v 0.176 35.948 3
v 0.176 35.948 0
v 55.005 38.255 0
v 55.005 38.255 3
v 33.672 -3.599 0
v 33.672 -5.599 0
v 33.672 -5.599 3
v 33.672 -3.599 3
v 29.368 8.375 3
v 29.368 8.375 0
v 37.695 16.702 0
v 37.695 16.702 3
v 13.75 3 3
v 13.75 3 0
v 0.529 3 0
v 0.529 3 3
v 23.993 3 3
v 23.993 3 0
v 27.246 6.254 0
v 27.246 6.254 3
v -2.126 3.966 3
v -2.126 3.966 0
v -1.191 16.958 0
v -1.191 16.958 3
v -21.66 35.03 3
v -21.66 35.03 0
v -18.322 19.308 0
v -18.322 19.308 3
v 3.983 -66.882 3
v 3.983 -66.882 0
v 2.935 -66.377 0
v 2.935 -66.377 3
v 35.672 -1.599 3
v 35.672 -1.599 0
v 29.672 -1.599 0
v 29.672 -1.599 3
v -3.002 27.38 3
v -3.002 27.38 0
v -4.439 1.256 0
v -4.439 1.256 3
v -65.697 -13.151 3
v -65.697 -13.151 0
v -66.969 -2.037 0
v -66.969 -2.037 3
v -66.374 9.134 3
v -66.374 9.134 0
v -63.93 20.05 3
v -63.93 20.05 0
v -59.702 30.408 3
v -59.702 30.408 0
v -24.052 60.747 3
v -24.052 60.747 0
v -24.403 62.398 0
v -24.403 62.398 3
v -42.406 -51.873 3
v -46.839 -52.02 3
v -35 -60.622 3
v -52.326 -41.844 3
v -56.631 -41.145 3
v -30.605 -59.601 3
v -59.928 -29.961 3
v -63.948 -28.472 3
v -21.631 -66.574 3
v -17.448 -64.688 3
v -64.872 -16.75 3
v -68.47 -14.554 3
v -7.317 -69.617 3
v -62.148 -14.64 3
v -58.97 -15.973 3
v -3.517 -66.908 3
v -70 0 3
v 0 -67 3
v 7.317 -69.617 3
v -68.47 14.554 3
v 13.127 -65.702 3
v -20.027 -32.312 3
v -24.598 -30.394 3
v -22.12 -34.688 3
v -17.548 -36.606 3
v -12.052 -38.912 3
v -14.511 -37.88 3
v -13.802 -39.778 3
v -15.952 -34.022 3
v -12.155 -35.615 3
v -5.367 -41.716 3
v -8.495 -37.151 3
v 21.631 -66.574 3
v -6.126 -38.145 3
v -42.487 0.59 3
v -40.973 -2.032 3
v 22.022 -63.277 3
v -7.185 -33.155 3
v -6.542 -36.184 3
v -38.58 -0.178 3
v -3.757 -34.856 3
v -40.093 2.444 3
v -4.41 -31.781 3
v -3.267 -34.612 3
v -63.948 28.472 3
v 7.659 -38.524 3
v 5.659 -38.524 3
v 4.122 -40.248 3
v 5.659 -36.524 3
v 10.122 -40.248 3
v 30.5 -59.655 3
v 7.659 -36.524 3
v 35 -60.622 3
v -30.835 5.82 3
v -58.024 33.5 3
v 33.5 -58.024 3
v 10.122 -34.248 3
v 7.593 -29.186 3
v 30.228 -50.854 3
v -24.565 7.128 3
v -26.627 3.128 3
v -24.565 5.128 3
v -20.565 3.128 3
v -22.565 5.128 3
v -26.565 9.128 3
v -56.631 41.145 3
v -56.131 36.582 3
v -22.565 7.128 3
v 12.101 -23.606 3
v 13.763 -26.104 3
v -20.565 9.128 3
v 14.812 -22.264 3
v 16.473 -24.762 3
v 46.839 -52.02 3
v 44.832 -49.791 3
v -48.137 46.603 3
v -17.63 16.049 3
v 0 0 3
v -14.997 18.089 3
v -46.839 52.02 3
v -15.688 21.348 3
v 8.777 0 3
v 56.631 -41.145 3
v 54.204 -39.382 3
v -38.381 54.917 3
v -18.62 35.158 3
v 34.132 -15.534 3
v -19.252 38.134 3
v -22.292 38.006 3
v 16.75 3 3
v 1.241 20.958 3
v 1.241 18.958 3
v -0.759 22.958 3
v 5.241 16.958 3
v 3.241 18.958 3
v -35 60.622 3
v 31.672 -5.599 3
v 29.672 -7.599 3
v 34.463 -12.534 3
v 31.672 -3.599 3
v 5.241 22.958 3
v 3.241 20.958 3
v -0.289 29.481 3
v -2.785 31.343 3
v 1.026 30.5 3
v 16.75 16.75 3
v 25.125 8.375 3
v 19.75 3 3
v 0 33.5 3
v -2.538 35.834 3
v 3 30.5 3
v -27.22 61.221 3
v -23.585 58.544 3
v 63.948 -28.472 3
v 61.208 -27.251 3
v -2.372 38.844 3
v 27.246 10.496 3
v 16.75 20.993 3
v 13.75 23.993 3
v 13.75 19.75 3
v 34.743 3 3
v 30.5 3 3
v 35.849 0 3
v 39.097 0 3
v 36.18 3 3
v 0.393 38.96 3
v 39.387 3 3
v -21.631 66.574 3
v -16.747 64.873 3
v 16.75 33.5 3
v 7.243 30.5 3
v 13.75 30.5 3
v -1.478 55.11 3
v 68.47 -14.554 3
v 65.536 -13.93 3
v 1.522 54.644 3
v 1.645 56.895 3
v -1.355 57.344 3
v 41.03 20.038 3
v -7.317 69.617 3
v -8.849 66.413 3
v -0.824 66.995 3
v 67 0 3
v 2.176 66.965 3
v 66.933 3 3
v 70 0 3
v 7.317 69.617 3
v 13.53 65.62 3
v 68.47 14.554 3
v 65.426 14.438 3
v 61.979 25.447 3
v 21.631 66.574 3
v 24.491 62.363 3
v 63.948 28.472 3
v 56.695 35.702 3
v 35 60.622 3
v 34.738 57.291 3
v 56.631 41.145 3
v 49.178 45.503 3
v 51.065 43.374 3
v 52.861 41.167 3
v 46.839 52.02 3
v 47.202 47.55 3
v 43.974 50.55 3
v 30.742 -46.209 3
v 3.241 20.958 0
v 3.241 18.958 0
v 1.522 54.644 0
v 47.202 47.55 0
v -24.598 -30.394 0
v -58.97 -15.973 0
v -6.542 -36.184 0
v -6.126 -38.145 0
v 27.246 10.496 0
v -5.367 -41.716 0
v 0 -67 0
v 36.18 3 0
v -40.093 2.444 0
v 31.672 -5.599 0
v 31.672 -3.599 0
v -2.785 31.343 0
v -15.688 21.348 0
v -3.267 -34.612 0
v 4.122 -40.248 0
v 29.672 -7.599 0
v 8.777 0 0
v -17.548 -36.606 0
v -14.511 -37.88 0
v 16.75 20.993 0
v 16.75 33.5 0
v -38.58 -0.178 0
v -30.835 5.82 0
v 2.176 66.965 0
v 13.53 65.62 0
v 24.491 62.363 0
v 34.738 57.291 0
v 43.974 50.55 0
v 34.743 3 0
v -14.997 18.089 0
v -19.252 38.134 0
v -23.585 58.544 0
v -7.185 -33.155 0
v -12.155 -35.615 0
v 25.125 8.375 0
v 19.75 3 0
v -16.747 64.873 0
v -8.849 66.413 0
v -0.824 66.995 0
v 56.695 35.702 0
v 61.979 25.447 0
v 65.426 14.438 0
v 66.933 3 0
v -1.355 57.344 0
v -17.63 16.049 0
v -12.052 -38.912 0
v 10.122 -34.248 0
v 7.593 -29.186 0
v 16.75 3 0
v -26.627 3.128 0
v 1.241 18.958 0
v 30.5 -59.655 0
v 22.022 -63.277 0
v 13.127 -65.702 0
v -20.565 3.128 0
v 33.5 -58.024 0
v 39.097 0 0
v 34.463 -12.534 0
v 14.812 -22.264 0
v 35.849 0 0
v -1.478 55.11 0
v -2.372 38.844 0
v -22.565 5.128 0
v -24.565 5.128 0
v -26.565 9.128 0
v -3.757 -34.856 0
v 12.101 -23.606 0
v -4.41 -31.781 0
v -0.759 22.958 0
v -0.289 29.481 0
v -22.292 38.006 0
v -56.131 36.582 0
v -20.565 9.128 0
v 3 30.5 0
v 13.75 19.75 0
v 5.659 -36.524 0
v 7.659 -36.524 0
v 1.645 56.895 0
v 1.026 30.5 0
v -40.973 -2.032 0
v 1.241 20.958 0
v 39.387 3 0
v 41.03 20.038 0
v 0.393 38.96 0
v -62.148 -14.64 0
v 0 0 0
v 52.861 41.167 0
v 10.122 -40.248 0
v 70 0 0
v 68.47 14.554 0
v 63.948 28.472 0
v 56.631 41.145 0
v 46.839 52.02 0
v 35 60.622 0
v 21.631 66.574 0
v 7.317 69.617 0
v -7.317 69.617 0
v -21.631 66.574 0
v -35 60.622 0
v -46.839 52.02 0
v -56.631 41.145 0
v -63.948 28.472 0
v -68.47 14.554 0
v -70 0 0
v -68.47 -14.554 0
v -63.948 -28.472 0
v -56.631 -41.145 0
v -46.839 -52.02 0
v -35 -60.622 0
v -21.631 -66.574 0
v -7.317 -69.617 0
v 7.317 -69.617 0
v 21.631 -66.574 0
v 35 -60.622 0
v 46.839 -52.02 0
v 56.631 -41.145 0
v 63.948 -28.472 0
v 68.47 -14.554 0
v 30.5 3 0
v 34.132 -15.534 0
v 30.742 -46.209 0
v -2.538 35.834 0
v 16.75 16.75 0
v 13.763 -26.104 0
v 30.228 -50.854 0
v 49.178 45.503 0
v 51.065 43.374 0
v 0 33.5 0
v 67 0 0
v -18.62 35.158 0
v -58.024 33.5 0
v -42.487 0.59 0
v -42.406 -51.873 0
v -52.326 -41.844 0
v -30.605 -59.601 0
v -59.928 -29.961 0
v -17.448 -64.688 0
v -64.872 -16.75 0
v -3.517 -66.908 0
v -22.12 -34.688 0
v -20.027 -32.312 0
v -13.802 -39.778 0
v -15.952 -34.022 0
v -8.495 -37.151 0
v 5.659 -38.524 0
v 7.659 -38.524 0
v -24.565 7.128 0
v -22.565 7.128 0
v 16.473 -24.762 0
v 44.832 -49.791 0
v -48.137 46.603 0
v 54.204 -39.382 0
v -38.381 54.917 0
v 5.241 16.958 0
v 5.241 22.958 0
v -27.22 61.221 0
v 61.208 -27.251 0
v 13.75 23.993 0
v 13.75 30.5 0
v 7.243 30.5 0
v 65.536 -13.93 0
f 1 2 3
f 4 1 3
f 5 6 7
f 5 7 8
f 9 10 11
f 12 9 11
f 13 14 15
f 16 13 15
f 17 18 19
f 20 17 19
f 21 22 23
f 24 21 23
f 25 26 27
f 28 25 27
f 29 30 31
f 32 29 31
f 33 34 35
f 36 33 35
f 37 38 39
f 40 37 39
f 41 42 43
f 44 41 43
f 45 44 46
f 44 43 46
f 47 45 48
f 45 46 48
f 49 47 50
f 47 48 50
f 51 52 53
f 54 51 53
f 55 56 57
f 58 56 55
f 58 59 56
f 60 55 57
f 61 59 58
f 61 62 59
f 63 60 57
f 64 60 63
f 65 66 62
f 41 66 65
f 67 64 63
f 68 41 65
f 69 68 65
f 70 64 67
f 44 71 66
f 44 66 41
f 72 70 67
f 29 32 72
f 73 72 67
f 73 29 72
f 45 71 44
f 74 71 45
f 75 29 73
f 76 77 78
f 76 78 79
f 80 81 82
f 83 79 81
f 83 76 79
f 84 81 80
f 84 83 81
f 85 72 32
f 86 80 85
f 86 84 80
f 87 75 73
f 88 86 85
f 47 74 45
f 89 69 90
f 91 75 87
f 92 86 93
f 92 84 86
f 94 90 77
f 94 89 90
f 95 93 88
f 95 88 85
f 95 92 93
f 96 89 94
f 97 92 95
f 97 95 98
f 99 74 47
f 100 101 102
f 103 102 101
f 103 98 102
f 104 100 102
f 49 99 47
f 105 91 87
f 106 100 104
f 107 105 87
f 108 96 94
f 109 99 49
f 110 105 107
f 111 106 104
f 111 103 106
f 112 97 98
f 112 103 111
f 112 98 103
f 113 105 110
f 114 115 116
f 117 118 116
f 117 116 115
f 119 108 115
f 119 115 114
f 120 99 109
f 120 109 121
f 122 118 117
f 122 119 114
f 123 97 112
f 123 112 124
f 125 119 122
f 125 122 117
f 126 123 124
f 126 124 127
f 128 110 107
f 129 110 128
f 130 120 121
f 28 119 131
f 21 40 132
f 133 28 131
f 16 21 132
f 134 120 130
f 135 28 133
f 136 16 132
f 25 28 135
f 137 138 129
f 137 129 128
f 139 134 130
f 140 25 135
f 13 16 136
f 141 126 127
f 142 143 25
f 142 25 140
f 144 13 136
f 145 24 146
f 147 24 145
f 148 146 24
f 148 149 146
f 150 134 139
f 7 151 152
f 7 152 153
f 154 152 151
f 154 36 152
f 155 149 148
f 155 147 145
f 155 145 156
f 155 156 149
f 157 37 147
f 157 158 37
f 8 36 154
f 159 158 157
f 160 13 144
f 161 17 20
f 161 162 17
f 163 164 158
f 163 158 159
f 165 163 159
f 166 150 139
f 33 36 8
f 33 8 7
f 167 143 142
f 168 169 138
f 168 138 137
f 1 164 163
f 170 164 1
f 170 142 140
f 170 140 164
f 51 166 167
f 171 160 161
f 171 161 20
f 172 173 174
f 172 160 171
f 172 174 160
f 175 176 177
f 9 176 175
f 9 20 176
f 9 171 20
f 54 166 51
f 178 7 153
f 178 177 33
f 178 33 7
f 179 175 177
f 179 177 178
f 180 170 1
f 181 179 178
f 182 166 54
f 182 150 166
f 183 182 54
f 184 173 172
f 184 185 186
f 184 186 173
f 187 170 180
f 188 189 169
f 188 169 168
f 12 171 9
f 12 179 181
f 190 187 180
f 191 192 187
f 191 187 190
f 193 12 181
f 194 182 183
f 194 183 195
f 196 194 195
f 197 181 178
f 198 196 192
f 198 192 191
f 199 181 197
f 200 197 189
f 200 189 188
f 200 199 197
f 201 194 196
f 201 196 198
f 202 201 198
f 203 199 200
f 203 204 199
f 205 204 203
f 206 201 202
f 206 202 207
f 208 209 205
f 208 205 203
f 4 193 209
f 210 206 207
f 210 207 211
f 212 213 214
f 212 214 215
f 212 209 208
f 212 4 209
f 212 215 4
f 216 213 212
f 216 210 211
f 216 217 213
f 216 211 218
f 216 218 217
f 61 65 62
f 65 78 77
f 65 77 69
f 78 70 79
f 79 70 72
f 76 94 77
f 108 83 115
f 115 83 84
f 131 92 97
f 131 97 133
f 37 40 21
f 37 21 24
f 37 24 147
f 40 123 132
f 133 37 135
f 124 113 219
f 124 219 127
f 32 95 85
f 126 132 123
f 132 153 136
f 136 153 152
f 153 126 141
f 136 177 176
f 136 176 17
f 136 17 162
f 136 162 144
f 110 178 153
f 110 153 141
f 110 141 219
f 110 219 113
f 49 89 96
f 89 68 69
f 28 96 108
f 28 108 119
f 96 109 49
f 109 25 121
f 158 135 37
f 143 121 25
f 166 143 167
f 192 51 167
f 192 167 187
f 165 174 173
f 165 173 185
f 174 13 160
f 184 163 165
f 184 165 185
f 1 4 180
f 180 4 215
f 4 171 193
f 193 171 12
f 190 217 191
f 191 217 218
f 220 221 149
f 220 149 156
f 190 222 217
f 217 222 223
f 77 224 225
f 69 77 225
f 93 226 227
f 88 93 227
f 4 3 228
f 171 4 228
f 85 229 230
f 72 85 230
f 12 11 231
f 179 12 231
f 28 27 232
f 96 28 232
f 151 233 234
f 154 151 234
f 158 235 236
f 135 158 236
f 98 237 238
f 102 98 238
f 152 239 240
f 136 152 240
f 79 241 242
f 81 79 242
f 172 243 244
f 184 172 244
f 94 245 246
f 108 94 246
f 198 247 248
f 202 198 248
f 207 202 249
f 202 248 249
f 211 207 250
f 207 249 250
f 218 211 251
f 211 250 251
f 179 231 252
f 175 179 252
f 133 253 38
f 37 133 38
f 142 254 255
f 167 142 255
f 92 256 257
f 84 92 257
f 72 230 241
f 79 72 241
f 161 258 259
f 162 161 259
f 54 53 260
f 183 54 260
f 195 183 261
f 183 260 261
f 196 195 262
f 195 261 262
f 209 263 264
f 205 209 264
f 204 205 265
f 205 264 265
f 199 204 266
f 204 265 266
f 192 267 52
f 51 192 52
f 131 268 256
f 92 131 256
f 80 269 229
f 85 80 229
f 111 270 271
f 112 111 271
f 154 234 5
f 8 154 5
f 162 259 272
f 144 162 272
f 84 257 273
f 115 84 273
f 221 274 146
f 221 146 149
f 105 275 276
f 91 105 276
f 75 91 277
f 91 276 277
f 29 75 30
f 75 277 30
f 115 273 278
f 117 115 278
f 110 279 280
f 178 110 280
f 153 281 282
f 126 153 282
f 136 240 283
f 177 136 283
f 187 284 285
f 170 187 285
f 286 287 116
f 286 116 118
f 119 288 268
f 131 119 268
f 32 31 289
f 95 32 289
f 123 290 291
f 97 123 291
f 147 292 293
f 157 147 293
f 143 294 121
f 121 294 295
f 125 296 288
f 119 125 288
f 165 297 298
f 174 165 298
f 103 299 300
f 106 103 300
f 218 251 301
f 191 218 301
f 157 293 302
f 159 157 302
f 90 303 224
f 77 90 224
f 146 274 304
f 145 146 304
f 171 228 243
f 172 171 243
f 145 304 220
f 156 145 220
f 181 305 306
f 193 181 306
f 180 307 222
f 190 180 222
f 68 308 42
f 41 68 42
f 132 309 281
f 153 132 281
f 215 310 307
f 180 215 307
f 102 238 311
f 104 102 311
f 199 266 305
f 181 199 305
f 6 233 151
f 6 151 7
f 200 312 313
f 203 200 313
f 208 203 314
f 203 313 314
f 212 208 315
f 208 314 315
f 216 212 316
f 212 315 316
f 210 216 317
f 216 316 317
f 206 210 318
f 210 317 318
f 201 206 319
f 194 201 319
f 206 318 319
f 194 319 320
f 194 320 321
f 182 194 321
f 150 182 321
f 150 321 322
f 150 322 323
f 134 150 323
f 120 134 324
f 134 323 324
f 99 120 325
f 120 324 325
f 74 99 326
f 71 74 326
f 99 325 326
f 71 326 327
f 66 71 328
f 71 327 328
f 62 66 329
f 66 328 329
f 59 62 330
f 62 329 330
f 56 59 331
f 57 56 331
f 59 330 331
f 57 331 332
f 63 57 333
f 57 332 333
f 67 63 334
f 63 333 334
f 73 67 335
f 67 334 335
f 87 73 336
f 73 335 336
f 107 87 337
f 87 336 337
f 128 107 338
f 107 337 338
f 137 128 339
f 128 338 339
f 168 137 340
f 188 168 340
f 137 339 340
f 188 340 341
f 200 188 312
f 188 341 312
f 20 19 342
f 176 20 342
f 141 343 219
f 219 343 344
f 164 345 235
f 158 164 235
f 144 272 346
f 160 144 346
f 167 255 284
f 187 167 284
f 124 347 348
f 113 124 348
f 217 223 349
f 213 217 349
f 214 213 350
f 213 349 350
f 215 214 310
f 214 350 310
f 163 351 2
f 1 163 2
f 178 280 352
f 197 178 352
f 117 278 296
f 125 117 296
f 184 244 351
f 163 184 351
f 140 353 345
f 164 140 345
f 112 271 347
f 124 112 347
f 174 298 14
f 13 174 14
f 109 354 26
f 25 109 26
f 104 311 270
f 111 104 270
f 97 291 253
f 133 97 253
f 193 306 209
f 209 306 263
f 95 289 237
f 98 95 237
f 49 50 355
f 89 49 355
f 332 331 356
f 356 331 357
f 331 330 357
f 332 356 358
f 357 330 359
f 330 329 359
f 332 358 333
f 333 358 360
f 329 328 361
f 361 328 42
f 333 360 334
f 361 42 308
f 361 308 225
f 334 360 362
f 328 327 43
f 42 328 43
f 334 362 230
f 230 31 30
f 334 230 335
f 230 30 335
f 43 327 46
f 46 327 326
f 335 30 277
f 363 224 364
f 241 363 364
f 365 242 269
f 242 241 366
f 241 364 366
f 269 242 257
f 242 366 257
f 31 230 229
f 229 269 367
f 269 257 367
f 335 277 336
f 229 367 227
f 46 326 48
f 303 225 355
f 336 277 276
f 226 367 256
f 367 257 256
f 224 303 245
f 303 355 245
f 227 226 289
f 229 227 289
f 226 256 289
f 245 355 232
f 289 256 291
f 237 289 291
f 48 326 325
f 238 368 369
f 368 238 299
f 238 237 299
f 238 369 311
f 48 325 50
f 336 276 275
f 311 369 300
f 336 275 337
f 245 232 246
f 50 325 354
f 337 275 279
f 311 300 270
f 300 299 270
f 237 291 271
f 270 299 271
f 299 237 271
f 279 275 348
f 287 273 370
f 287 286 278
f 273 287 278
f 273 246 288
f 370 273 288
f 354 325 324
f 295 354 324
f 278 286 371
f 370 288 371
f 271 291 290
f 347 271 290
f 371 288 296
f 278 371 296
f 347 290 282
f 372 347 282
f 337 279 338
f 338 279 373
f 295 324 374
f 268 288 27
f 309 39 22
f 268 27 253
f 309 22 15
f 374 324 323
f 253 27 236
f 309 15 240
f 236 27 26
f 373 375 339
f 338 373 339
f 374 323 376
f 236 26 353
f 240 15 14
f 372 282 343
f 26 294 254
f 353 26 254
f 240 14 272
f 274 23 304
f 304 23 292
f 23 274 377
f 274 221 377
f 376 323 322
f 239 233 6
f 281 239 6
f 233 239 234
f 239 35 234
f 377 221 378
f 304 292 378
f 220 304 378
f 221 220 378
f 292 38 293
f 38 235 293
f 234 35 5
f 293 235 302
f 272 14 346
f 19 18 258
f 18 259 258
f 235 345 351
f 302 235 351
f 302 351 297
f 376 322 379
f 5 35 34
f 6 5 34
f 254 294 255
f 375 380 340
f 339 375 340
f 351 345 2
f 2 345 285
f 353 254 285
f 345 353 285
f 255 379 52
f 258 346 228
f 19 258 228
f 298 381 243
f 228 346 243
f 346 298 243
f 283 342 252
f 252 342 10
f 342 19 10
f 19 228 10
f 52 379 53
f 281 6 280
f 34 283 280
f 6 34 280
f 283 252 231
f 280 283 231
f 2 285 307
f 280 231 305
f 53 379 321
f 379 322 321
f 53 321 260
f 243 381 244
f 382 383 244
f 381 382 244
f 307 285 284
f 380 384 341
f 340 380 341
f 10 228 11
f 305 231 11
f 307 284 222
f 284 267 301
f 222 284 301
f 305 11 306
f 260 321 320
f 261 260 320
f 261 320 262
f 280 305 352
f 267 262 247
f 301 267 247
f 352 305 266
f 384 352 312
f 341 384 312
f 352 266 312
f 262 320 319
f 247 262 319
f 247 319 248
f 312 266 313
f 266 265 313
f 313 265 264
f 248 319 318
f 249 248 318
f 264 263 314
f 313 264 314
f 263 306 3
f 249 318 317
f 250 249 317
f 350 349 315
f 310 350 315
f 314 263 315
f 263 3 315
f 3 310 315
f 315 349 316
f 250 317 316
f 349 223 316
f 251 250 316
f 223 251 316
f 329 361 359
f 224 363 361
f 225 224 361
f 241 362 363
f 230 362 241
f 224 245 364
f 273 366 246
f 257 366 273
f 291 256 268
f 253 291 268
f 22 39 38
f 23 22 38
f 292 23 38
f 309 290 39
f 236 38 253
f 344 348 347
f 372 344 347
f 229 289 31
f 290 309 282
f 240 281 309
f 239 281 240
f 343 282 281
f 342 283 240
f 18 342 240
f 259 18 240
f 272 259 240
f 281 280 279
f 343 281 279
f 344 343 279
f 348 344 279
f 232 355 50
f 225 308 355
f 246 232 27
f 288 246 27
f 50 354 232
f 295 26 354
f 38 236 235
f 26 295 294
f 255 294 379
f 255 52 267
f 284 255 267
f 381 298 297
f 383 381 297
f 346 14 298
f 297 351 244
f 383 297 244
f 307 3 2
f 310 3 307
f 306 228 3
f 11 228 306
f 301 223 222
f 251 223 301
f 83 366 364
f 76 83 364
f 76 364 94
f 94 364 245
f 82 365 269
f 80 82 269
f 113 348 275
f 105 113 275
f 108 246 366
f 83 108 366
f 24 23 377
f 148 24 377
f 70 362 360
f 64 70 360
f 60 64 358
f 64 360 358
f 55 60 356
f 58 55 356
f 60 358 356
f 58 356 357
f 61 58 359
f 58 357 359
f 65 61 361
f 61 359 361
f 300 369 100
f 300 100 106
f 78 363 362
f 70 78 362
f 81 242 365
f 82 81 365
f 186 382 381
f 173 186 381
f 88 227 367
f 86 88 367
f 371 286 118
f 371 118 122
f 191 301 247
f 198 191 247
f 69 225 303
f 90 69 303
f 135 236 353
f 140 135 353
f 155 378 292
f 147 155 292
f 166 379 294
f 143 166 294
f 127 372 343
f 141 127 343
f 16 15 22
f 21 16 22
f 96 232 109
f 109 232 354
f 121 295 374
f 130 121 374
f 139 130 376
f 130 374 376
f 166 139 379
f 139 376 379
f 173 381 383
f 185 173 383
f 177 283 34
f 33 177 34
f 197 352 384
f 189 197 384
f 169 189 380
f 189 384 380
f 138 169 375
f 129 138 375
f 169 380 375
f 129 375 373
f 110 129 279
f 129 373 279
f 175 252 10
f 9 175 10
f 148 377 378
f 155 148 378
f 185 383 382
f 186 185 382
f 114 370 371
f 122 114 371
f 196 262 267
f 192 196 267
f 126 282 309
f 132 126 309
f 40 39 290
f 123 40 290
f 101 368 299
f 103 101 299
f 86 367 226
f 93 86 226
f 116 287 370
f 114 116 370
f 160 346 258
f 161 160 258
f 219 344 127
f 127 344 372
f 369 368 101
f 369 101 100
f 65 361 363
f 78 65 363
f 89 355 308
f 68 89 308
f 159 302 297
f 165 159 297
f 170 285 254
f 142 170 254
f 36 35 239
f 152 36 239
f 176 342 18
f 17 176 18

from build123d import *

# Parameters (mm, degrees)
F0_R     = 70
F0_W     = 2
F0_H     = 2
F1_DEPTH = 3


with BuildPart() as f1:
    # F0 (on Top) → F1 (new body)
    with BuildSketch(Plane.XY):
        Circle(F0_R)
        with BuildLine():
            Line((-64.872471, -16.75), (-22.119673, -34.687602))
            Line((-22.119673, -34.687602), (-3.517446, -66.907605))
            ThreePointArc((-3.517446, -66.907605), (-42.405678, -51.872521), (-64.872471, -16.75))
        make_face(mode=Mode.SUBTRACT)
        Polygon((-5.367487, -41.716243), (0, -67), (-17.548193, -36.605638), (-14.51137, -37.879784), (-13.802188, -39.778319), (-12.051845, -38.911716), align=None, mode=Mode.SUBTRACT)
        Polygon((-6.541978, -36.183757), (-6.125672, -38.144779), (-8.494983, -37.150698), align=None, mode=Mode.SUBTRACT)
        Polygon((-24.598448, -30.394239), (-58.970352, -15.972971), (-40.973159, -2.032406), align=None, mode=Mode.SUBTRACT)
        Polygon((-38.579524, -0.178304), (-30.835223, 5.820406), (-15.952495, -34.021783), (-20.026968, -32.312274), align=None, mode=Mode.SUBTRACT)
        Polygon((-12.154838, -35.615149), (-26.627104, 3.128202), (-20.564876, 3.128202), (-20.564876, 9.128202), (-26.564876, 9.128202), (-17.630423, 16.0488), (-7.185041, -33.154581), align=None, mode=Mode.SUBTRACT)
        Polygon((-4.438957, 1.256214), (12.101127, -23.605912), (-4.409872, -31.780582), (-14.996661, 18.088903), (-3.002486, 27.379551), align=None, mode=Mode.SUBTRACT)
        with BuildLine():
            Line((13.762816, -26.10367), (30.228223, -50.853546))
            Line((30.228223, -50.853546), (30.5, -59.65526))
            ThreePointArc((30.5, -59.65526), (17.615943, -64.642699), (3.982851, -66.881514))
            Line((3.982851, -66.881514), (2.934602, -66.377014))
            Line((2.934602, -66.377014), (-3.756953, -34.856183))
            Line((-3.756953, -34.856183), (-3.267222, -34.611524))
            Line((-3.267222, -34.611524), (4.122172, -40.248352))
            Line((4.122172, -40.248352), (10.122172, -40.248352))
            Line((10.122172, -40.248352), (10.122172, -34.248352))
            Line((10.122172, -34.248352), (7.593094, -29.185935))
            Line((7.593094, -29.185935), (13.762816, -26.10367))
        make_face(mode=Mode.SUBTRACT)
        with Locations((6.658501, -37.52363)):
            Rectangle(F0_W, F0_H, mode=Mode.SUBTRACT)
        Polygon((34.131849, -15.534241), (30.741558, -46.208985), (16.473278, -24.761707), align=None, mode=Mode.SUBTRACT)
        Polygon((0, 0), (34.46342, -12.534241), (14.811589, -22.26395), align=None, mode=Mode.SUBTRACT)
        Polygon((29.671986, -1.599358), (29.671986, -7.599358), (8.777233, 0), (35.848753, 0), (35.671986, -1.599358), align=None, mode=Mode.SUBTRACT)
        with Locations((32.671986, -4.599358)):
            Rectangle(F0_W, F0_H, mode=Mode.SUBTRACT)
        with BuildLine():
            Line((39.09744, 0), (67, 0))
            ThreePointArc((67, 0), (58.023702, -33.5), (33.5, -58.023702))
            Line((33.5, -58.023702), (39.09744, 0))
        make_face(mode=Mode.SUBTRACT)
        with BuildLine():
            Line((-42.487027, 0.58969), (-62.148088, -14.639702))
            Line((-62.148088, -14.639702), (-65.696695, -13.150829))
            ThreePointArc((-65.696695, -13.150829), (-66.374453, 9.134109), (-59.702408, 30.407605))
            Line((-59.702408, 30.407605), (-42.487027, 0.58969))
        make_face(mode=Mode.SUBTRACT)
        Polygon((-40.093392, 2.443792), (-58.023702, 33.5), (-21.659897, 35.029796), (-18.322244, 19.307651), align=None, mode=Mode.SUBTRACT)
        with Locations((-23.564876, 6.128202)):
            Rectangle(F0_W, F0_H, mode=Mode.SUBTRACT)
        Polygon((-18.620189, 35.157674), (-2.537579, 35.834256), (-2.784538, 31.343106), (-15.688482, 21.347754), align=None, mode=Mode.SUBTRACT)
        with BuildLine():
            ThreePointArc((-56.131438, 36.58226), (-43.458519, 50.993697), (-27.22012, 61.221443))
            Line((-27.22012, 61.221443), (-22.291688, 38.00587))
            Line((-22.291688, 38.00587), (-56.131438, 36.58226))
        make_face(mode=Mode.SUBTRACT)
        Polygon((-19.251979, 38.133748), (-23.584773, 58.543545), (-1.477635, 55.110162), (-2.372086, 38.843872), align=None, mode=Mode.SUBTRACT)
        with BuildLine():
            Line((-1.354779, 57.344402), (-24.052467, 60.746633))
            Line((-24.052467, 60.746633), (-24.403006, 62.397863))
            ThreePointArc((-24.403006, 62.397863), (-12.821278, 65.761804), (-0.824116, 66.994931))
            Line((-0.824116, 66.994931), (-1.354779, 57.344402))
        make_face(mode=Mode.SUBTRACT)
        Polygon((-0.289354, 29.481134), (1.025996, 30.5), (3, 30.5), (13.75, 19.75), (13.75, 3), (0.528608, 3), (-2.126445, 3.965635), (-1.191021, 16.957822), (5.240974, 16.957822), (5.240974, 22.957822), (-0.759026, 22.957822), align=None, mode=Mode.SUBTRACT)
        Polygon((27.24632, 6.25368), (30.5, 3), (23.992641, 3), align=None, mode=Mode.SUBTRACT)
        Polygon((25.125, 8.375), (19.75, 3), (16.75, 3), (16.75, 16.75), align=None, mode=Mode.SUBTRACT)
        Polygon((36.180325, 3), (34.742641, 3), (29.367641, 8.375), (37.694733, 16.702092), align=None, mode=Mode.SUBTRACT)
        with Locations((2.240974, 19.957822)):
            Rectangle(F0_W, F0_H, mode=Mode.SUBTRACT)
        Polygon((7.242641, 30.5), (13.75, 30.5), (13.75, 23.992641), align=None, mode=Mode.SUBTRACT)
        Polygon((16.75, 33.5), (0, 33.5), (0.176284, 35.948426), (55.005027, 38.255027), (27.24632, 10.49632), (16.75, 20.992641), align=None, mode=Mode.SUBTRACT)
        with BuildLine():
            ThreePointArc((56.6951, 35.70246), (63.940029, 20.016811), (66.932802, 3))
            Line((66.932802, 3), (39.386844, 3))
            Line((39.386844, 3), (41.03045, 20.03781))
            Line((41.03045, 20.03781), (56.6951, 35.70246))
        make_face(mode=Mode.SUBTRACT)
        with BuildLine():
            ThreePointArc((47.201731, 47.549938), (50.132824, 44.448847), (52.86057, 41.167465))
            Line((52.86057, 41.167465), (0.393129, 38.960202))
            Line((0.393129, 38.960202), (1.522365, 54.644242))
            Line((1.522365, 54.644242), (47.201731, 47.549938))
        make_face(mode=Mode.SUBTRACT)
        with BuildLine():
            Line((43.973899, 50.549938), (1.645221, 56.894722))
            Line((1.645221, 56.894722), (2.175884, 66.964659))
            ThreePointArc((2.175884, 66.964659), (24.491047, 62.363359), (43.973899, 50.549938))
        make_face(mode=Mode.SUBTRACT)
    extrude(amount=F1_DEPTH)


solid = f1.part
